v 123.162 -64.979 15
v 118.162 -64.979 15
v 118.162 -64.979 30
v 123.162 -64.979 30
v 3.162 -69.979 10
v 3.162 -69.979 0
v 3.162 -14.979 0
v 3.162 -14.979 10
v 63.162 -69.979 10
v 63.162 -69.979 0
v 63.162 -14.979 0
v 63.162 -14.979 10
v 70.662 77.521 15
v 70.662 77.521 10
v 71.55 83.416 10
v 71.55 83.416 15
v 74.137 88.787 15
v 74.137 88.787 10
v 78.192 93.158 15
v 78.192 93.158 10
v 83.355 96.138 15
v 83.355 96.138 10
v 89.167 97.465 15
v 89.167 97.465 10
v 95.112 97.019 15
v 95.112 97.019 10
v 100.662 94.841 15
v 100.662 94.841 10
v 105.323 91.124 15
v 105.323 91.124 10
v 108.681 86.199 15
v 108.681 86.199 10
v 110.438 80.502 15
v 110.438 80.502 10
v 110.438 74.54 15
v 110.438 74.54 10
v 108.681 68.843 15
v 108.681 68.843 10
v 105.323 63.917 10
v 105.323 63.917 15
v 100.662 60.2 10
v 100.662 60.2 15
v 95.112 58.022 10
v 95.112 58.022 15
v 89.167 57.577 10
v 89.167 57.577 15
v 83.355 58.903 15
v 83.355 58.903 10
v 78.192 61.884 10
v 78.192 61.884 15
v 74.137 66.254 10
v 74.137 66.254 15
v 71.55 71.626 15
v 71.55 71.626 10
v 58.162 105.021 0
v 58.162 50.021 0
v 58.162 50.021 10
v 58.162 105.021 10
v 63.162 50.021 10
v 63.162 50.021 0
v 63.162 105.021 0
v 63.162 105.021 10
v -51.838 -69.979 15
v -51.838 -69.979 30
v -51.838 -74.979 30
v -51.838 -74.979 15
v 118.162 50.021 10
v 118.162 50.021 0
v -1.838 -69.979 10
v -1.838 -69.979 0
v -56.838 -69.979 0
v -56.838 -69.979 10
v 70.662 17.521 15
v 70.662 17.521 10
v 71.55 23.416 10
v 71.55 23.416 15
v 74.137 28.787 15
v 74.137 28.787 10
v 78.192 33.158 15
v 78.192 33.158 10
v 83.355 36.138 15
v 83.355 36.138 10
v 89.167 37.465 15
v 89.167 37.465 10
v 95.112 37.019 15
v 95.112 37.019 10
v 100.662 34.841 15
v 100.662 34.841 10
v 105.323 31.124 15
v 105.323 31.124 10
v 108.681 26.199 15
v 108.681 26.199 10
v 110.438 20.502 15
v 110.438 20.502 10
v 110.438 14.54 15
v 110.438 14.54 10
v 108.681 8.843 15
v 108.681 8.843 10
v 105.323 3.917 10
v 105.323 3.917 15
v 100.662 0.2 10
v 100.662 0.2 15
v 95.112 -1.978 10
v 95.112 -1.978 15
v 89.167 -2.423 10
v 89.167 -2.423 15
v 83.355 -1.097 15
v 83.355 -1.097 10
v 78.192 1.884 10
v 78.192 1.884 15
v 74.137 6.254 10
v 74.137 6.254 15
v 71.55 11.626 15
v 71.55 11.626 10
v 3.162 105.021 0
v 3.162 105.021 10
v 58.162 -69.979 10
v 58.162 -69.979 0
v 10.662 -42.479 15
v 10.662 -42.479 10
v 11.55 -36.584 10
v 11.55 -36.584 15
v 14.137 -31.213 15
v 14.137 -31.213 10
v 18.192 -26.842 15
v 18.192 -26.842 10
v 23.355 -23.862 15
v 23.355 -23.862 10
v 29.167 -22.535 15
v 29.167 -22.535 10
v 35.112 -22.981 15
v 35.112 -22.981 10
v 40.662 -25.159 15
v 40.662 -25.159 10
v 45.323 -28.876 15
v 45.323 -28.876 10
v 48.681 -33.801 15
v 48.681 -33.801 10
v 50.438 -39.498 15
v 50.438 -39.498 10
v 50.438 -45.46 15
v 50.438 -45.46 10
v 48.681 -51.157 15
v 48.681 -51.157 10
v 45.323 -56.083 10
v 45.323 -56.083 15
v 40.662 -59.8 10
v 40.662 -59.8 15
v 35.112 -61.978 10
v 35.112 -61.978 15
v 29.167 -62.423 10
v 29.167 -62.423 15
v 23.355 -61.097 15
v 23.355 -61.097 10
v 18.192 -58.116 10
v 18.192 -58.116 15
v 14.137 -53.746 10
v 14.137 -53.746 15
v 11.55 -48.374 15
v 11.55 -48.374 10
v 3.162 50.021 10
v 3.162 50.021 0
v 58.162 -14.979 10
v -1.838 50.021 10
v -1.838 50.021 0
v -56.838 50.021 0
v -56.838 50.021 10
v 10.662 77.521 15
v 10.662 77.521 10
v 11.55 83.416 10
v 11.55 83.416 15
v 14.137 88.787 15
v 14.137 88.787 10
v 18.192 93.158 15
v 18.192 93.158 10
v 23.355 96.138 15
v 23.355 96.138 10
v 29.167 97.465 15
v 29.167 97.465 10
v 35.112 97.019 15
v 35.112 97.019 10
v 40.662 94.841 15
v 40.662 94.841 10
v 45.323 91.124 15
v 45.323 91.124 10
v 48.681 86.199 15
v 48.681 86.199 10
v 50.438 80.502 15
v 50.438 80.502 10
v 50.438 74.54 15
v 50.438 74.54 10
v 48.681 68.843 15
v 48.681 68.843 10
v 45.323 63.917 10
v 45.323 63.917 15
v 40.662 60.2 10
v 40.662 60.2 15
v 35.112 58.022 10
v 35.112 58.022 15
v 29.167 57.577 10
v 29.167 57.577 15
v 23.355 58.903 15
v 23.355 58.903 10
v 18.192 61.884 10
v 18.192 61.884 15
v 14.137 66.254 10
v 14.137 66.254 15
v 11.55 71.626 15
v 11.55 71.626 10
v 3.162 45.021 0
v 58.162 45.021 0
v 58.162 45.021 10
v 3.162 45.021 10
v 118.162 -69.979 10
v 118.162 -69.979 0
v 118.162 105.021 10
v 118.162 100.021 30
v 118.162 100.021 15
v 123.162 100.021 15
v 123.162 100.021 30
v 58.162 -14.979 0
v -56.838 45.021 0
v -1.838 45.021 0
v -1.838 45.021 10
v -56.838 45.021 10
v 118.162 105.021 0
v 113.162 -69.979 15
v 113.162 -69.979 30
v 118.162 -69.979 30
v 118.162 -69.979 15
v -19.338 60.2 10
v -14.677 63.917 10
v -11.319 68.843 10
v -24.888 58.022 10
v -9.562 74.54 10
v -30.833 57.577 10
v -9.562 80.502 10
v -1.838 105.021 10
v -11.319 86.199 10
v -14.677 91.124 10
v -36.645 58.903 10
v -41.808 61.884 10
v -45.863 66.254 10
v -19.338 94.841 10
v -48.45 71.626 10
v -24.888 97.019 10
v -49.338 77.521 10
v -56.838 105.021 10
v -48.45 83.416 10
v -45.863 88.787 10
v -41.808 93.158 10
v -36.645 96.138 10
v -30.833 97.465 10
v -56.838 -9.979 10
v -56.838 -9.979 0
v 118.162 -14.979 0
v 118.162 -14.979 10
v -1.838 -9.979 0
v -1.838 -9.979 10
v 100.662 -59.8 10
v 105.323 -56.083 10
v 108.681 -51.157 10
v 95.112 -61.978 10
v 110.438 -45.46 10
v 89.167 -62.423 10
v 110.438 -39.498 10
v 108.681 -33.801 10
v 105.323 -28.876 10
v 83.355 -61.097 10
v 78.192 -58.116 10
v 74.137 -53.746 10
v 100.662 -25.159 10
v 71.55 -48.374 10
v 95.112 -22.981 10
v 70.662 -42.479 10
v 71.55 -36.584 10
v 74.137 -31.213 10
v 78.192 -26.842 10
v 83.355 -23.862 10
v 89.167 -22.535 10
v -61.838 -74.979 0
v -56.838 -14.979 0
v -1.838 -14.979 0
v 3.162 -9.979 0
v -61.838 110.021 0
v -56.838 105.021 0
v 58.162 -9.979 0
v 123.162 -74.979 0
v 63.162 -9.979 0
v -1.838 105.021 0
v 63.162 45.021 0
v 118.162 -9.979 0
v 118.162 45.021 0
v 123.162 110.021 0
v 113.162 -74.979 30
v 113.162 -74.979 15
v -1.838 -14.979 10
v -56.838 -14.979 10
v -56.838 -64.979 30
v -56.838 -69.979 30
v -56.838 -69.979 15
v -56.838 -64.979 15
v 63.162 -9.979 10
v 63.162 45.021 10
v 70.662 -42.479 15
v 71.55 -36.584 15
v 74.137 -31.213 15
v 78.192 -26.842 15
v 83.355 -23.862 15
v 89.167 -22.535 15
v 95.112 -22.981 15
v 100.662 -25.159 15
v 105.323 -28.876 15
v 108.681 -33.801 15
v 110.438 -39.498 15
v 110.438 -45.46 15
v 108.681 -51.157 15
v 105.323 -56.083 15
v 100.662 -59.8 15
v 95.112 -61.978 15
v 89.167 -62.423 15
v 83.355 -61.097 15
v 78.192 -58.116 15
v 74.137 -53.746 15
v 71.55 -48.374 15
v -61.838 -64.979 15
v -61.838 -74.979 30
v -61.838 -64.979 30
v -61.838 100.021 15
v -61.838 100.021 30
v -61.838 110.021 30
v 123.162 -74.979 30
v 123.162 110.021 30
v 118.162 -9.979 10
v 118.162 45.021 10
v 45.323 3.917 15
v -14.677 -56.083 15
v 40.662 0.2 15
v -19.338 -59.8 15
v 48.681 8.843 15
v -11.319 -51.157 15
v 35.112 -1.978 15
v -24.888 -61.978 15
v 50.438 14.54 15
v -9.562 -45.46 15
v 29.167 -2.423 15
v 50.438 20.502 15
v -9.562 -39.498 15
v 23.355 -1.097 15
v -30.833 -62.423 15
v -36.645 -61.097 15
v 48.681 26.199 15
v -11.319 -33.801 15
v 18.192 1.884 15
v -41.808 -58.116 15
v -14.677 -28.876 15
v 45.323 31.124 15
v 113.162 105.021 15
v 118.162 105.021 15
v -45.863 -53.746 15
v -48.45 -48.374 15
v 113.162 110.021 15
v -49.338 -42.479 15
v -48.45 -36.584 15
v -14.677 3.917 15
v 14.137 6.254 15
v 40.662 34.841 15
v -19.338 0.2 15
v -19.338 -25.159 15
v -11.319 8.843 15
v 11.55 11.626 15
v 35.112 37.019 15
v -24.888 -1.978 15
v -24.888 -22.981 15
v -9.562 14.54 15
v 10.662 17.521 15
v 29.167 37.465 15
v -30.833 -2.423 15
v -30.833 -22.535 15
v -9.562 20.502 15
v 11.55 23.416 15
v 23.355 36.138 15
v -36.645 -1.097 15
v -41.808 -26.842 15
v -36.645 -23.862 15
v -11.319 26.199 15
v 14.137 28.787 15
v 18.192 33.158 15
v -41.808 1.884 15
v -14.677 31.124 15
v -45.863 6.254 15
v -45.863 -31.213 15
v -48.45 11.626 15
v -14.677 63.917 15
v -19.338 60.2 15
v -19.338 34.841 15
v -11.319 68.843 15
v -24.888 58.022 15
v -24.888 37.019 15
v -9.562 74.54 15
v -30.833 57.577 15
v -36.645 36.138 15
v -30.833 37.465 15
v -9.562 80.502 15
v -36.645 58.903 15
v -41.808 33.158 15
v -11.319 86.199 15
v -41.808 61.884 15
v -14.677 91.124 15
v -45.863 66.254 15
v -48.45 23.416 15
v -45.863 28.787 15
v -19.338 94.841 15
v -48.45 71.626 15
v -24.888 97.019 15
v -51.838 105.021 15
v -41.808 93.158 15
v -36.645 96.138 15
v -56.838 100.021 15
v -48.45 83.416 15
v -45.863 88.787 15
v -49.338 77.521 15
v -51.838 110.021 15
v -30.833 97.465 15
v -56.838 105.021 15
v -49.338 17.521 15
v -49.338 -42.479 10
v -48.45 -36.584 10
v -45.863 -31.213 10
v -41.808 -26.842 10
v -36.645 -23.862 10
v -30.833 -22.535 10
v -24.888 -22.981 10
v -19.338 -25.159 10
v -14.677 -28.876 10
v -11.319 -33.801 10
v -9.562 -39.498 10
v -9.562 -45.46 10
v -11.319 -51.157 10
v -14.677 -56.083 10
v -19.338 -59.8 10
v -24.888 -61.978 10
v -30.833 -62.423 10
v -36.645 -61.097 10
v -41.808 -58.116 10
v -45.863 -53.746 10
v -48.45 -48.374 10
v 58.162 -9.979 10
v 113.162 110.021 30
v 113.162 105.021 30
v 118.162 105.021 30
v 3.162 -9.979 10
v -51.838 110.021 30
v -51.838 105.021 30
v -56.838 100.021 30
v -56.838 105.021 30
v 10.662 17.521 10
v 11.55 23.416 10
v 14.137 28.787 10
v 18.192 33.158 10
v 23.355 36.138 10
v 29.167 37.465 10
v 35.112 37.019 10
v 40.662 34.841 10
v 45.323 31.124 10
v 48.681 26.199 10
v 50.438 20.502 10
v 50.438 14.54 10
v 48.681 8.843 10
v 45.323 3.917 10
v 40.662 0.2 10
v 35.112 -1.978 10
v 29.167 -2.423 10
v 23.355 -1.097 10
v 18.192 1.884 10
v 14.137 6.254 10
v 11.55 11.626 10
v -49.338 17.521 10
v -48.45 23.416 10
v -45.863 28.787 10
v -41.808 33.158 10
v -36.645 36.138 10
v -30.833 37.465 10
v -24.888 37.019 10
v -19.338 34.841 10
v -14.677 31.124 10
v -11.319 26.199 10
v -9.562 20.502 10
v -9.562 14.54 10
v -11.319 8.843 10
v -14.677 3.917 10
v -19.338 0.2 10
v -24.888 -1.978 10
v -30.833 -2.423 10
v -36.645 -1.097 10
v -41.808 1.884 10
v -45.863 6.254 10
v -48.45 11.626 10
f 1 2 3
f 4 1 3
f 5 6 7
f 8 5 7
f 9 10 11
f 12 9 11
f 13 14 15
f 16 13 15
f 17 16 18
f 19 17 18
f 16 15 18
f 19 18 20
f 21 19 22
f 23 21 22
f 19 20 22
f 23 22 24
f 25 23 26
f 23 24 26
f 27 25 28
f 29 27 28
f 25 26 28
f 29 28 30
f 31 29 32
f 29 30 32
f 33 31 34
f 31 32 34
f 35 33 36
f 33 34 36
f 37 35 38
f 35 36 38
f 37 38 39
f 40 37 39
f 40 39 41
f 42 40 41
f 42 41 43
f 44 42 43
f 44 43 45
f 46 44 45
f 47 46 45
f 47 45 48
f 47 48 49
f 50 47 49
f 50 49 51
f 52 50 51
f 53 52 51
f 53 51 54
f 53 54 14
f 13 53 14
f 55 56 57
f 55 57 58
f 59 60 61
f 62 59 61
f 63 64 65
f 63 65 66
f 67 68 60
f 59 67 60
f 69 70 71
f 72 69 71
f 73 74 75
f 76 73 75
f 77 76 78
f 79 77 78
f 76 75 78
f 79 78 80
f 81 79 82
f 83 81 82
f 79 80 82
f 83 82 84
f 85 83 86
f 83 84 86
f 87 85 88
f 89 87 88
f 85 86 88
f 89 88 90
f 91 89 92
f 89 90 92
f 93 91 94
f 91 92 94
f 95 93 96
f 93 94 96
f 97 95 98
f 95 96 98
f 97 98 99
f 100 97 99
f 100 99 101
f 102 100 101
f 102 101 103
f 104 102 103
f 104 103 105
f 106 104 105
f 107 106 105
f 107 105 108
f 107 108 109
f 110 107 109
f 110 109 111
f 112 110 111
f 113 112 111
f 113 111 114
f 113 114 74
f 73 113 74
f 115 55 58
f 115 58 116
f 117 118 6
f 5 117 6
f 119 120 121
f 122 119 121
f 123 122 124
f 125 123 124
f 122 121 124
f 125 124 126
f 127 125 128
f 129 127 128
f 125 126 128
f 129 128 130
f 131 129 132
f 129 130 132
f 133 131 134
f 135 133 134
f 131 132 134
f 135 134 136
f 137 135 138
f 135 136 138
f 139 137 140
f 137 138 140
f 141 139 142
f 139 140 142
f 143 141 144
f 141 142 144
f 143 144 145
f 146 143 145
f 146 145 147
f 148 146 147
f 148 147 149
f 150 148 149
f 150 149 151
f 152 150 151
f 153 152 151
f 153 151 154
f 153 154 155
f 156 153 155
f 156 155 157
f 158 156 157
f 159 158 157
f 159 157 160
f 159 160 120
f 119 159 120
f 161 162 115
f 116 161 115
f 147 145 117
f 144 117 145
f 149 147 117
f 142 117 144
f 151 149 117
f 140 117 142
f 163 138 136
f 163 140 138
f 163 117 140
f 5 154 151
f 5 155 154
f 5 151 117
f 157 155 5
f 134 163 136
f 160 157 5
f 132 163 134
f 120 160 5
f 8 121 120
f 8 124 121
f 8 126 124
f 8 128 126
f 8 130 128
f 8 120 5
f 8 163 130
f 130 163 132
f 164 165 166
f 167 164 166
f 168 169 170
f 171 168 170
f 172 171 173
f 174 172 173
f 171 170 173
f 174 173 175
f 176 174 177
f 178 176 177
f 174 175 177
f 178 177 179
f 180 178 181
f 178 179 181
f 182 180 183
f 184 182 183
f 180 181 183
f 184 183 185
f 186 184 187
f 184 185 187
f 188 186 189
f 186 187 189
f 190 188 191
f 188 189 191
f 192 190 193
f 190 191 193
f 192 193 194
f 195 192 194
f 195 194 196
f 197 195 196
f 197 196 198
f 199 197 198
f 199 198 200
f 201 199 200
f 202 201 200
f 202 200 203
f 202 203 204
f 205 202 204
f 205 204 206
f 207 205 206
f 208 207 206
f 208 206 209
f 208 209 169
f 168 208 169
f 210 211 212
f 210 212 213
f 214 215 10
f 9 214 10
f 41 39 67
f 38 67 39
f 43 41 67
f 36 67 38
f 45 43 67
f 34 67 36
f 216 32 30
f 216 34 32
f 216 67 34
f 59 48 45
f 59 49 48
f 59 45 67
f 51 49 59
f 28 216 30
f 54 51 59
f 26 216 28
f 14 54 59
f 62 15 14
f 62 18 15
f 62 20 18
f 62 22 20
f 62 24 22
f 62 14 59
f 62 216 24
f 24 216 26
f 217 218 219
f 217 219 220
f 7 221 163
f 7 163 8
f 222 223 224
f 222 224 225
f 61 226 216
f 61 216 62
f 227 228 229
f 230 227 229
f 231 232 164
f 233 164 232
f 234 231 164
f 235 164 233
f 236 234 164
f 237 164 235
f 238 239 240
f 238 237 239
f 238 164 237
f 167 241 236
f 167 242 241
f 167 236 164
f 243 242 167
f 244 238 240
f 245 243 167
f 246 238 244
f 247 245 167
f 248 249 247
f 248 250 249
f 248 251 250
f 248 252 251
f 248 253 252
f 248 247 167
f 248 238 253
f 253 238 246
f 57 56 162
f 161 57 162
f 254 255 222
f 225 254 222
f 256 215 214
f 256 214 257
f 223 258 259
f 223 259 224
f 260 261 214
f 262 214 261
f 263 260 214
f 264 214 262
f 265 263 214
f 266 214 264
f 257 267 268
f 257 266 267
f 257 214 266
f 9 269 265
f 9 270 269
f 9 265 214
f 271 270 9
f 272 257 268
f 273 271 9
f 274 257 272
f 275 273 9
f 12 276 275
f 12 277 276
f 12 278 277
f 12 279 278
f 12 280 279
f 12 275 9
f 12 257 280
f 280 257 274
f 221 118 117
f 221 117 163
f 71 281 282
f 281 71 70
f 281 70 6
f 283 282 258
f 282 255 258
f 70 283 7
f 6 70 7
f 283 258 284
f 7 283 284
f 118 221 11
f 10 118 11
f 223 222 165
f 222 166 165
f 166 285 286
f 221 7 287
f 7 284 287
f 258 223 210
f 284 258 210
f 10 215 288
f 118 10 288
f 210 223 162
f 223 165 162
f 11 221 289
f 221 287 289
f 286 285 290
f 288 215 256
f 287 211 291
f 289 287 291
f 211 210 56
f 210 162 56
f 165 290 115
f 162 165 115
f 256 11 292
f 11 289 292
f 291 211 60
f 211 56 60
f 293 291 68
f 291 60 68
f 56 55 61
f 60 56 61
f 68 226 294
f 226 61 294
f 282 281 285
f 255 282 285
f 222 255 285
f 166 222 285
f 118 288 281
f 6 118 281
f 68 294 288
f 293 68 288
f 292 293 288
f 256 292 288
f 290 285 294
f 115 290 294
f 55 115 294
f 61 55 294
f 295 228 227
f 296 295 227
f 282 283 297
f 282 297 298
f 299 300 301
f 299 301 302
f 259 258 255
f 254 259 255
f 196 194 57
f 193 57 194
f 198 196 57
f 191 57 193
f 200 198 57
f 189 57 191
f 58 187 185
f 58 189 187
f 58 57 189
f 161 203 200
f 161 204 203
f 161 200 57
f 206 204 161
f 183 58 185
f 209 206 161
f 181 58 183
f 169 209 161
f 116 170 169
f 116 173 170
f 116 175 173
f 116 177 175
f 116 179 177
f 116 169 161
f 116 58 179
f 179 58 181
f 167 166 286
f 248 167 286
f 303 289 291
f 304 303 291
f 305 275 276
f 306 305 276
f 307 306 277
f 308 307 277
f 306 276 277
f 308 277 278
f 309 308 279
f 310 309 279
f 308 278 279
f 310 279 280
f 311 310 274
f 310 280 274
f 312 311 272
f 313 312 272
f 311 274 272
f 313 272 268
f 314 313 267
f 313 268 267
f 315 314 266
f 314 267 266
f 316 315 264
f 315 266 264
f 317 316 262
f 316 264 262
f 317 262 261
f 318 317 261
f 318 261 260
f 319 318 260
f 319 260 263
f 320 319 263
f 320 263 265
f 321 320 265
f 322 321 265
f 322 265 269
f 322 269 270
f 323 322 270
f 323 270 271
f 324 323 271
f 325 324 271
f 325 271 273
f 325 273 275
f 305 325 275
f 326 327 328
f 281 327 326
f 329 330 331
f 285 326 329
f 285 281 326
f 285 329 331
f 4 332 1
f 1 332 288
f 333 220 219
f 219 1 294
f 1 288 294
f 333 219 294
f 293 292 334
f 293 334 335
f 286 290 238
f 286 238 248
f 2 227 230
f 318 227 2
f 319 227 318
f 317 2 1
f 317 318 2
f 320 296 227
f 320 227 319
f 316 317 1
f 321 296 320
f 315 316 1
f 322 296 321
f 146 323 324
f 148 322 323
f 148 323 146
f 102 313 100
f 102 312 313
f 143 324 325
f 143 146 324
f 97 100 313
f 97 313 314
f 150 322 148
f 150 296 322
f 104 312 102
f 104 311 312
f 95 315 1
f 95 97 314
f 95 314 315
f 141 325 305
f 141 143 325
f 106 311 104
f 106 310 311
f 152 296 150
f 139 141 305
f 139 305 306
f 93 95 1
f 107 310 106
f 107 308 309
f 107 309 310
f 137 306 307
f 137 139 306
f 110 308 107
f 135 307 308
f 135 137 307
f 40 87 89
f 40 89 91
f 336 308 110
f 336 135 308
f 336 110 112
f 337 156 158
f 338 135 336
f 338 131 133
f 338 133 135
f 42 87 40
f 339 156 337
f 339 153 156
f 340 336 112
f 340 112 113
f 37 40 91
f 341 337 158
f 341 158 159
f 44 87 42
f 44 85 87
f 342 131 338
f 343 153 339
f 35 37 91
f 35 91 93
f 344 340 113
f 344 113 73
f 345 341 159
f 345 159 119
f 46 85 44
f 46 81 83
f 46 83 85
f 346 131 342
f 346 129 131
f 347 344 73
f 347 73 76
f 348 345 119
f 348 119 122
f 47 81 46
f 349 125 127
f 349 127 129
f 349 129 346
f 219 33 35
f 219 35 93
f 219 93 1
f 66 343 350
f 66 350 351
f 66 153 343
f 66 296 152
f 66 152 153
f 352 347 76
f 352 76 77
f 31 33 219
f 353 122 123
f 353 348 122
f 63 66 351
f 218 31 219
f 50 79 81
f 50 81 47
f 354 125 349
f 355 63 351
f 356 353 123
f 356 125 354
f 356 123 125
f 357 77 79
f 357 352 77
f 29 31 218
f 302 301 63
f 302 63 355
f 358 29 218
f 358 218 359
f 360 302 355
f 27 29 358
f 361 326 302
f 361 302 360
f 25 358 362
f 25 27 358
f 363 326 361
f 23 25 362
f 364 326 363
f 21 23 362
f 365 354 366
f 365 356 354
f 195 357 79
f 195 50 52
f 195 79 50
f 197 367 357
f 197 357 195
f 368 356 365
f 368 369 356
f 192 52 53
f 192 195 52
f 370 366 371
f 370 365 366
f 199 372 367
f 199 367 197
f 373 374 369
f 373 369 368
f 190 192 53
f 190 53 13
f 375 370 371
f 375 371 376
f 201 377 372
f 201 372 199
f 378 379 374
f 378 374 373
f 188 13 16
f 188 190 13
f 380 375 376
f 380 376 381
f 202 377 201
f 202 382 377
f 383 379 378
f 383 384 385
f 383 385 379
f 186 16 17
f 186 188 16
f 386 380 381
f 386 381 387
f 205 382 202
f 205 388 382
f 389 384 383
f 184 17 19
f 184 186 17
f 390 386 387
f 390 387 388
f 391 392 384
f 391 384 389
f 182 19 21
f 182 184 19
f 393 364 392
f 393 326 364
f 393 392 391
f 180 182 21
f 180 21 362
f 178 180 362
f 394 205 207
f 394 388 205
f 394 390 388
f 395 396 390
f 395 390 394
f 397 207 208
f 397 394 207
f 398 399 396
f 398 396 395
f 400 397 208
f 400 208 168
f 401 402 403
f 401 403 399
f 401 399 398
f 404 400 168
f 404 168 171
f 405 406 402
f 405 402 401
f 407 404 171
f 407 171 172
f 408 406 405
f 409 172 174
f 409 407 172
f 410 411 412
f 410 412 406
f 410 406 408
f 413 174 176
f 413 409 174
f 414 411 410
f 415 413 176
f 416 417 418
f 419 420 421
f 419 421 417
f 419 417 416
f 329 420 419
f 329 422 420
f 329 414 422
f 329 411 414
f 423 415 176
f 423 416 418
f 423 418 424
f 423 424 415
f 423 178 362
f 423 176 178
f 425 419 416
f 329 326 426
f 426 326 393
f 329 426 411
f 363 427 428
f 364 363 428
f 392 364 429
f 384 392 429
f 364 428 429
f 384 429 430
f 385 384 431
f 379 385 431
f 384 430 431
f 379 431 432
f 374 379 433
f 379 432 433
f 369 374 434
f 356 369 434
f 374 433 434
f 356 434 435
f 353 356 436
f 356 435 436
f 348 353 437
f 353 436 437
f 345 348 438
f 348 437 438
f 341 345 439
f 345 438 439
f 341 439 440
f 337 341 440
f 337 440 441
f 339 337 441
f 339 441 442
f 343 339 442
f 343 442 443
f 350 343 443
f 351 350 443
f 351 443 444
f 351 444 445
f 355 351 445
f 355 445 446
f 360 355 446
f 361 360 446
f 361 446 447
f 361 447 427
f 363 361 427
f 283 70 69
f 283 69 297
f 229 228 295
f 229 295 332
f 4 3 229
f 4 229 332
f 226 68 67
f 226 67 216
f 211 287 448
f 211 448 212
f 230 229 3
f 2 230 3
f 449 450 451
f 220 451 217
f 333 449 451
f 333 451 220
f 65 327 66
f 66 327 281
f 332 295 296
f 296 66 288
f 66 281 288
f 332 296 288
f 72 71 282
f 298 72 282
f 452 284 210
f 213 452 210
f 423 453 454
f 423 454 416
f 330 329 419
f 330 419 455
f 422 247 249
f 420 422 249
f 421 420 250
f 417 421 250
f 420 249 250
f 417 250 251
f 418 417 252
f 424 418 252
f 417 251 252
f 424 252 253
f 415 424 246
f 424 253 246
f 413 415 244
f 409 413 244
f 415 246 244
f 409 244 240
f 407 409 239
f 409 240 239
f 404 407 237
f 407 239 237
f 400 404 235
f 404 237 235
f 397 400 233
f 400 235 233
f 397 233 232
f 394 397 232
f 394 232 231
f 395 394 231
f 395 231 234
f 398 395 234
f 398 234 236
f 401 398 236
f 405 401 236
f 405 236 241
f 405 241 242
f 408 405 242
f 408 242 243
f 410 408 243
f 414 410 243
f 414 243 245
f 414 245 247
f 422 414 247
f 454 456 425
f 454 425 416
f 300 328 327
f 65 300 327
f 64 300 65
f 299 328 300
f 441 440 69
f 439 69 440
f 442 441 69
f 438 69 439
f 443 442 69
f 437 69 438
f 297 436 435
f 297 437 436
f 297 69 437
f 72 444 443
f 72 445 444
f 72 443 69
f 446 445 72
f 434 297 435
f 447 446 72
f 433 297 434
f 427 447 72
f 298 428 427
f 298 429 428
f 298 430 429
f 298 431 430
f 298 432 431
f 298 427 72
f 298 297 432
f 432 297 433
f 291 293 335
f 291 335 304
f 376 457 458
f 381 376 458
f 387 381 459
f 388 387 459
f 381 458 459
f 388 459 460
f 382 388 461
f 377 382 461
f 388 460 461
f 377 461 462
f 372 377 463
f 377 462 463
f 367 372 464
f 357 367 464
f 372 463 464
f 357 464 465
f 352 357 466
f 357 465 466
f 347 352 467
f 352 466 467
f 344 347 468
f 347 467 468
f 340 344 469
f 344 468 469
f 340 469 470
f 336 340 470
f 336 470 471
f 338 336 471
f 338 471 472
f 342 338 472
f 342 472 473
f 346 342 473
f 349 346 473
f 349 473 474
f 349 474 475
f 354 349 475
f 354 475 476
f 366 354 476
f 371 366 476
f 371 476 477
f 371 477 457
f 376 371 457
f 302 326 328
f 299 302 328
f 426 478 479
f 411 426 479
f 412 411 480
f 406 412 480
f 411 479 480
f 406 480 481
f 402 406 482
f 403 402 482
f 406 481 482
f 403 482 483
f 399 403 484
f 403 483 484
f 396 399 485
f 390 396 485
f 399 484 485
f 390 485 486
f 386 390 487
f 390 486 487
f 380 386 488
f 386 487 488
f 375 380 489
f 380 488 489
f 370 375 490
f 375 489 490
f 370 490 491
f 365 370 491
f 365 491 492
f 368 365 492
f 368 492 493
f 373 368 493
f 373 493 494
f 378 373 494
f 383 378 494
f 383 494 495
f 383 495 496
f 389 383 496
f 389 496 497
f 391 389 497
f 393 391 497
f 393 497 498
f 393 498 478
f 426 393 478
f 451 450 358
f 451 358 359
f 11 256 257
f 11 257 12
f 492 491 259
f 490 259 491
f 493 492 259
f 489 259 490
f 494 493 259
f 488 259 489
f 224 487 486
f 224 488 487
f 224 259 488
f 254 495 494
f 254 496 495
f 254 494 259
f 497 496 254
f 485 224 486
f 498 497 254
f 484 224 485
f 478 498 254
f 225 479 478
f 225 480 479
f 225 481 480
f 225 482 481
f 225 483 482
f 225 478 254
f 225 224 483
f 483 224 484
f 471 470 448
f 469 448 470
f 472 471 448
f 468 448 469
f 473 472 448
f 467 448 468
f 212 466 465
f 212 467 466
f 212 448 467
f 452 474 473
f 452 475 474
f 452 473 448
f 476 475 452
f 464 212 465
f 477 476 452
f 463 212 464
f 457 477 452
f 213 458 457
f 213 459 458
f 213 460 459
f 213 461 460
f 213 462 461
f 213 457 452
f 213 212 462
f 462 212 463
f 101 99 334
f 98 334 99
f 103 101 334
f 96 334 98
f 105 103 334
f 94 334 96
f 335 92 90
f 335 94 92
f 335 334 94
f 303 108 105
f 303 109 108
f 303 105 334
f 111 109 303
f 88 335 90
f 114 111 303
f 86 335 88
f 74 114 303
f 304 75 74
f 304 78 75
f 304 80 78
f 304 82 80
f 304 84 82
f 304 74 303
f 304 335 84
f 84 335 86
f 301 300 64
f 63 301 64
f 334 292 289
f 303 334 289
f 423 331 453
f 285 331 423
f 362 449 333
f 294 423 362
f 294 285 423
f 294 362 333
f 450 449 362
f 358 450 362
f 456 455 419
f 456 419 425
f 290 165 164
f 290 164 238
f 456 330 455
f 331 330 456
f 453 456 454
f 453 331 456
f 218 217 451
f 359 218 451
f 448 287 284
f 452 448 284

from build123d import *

# Parameters (mm, degrees)
SKETCH5_W           = 185
SKETCH5_H           = 185
BOSS_EXTRUDE5_DEPTH = 30
SKETCH6_W           = 55
SKETCH6_H           = 55
CUT_EXTRUDE2_DEPTH  = 10
SKETCH7_R           = 20
CUT_EXTRUDE3_DEPTH  = 167.353137545
SKETCH8_W           = 175
SKETCH8_H           = 175
CUT_EXTRUDE4_DEPTH  = 15
SKETCH9_W           = 165
SKETCH9_H           = 15
CUT_EXTRUDE6_DEPTH  = 225.262725022
SKETCH11_W          = 15
SKETCH11_H          = 165
CUT_EXTRUDE7_DEPTH  = 218.323713701


with BuildPart() as part:
    # Sketch5 → Boss-Extrude5 (new body)
    with BuildSketch(Plane.XY):
        with Locations((30.661559889, 17.520891365)):
            Rectangle(SKETCH5_W, SKETCH5_H)
    extrude(amount=BOSS_EXTRUDE5_DEPTH)

    # Sketch6 → Cut-Extrude2 (cut)
    with BuildSketch(Plane(origin=(0, 0, 0), x_dir=(-1, 0, 0), z_dir=(0, 0, -1))):
        with Locations((29.338440111, 17.520891365)):
            Rectangle(SKETCH6_W, SKETCH6_H)
        with Locations((29.338440111, -42.479108635)):
            Rectangle(SKETCH6_W, SKETCH6_H)
        with Locations((-30.661559889, -42.479108635)):
            Rectangle(SKETCH6_W, SKETCH6_H)
        with Locations((-30.661559889, 17.520891365)):
            Rectangle(SKETCH6_W, SKETCH6_H)
        with Locations((-30.661559889, 77.520891365)):
            Rectangle(SKETCH6_W, SKETCH6_H)
        with Locations((-90.661559889, 77.520891365)):
            Rectangle(SKETCH6_W, SKETCH6_H)
        with Locations((-90.661559889, 17.520891365)):
            Rectangle(SKETCH6_W, SKETCH6_H)
        with Locations((-90.661559889, -42.479108635)):
            Rectangle(SKETCH6_W, SKETCH6_H)
        with Locations((29.338440111, 77.520891365)):
            Rectangle(SKETCH6_W, SKETCH6_H)
    extrude(amount=-CUT_EXTRUDE2_DEPTH, mode=Mode.SUBTRACT)

    # Sketch7 → Cut-Extrude3 (cut, through all)
    with BuildSketch(Plane(origin=(0, 0, 10), x_dir=(-1, 0, 0), z_dir=(0, 0, -1))):
        with Locations((-90.661559889, 77.520891365)):
            Circle(SKETCH7_R)
        with Locations((-30.661559889, 77.520891365)):
            Circle(SKETCH7_R)
        with Locations((29.338440111, 77.520891365)):
            Circle(SKETCH7_R)
        with Locations((29.338440111, 17.520891365)):
            Circle(SKETCH7_R)
        with Locations((-30.661559889, 17.520891365)):
            Circle(SKETCH7_R)
        with Locations((-90.661559889, 17.520891365)):
            Circle(SKETCH7_R)
        with Locations((29.338440111, -42.479108635)):
            Circle(SKETCH7_R)
        with Locations((-90.661559889, -42.479108635)):
            Circle(SKETCH7_R)
        with Locations((-30.661559889, -42.479108635)):
            Circle(SKETCH7_R)
    extrude(amount=-CUT_EXTRUDE3_DEPTH, mode=Mode.SUBTRACT)

    # Sketch8 → Cut-Extrude4 (cut)
    with BuildSketch(Plane.XY.offset(30)):
        with Locations((30.661559889, 17.520891365)):
            Rectangle(SKETCH8_W, SKETCH8_H)
    extrude(amount=-CUT_EXTRUDE4_DEPTH, mode=Mode.SUBTRACT)

    # Sketch9 → Cut-Extrude6 (cut, through all)
    with BuildSketch(Plane(origin=(0, 110.020891365, 0), x_dir=(1, 0, 0), z_dir=(0, 1, 0))):
        with Locations((30.661559889, -22.5)):
            Rectangle(SKETCH9_W, SKETCH9_H)
    extrude(amount=-CUT_EXTRUDE6_DEPTH, mode=Mode.SUBTRACT)

    # Sketch11 → Cut-Extrude7 (cut, through all)
    with BuildSketch(Plane.ZY.offset(61.838440111)):
        with Locations((22.5, 17.520891365)):
            Rectangle(SKETCH11_W, SKETCH11_H)
    extrude(amount=-CUT_EXTRUDE7_DEPTH, mode=Mode.SUBTRACT)


solid = part.part
